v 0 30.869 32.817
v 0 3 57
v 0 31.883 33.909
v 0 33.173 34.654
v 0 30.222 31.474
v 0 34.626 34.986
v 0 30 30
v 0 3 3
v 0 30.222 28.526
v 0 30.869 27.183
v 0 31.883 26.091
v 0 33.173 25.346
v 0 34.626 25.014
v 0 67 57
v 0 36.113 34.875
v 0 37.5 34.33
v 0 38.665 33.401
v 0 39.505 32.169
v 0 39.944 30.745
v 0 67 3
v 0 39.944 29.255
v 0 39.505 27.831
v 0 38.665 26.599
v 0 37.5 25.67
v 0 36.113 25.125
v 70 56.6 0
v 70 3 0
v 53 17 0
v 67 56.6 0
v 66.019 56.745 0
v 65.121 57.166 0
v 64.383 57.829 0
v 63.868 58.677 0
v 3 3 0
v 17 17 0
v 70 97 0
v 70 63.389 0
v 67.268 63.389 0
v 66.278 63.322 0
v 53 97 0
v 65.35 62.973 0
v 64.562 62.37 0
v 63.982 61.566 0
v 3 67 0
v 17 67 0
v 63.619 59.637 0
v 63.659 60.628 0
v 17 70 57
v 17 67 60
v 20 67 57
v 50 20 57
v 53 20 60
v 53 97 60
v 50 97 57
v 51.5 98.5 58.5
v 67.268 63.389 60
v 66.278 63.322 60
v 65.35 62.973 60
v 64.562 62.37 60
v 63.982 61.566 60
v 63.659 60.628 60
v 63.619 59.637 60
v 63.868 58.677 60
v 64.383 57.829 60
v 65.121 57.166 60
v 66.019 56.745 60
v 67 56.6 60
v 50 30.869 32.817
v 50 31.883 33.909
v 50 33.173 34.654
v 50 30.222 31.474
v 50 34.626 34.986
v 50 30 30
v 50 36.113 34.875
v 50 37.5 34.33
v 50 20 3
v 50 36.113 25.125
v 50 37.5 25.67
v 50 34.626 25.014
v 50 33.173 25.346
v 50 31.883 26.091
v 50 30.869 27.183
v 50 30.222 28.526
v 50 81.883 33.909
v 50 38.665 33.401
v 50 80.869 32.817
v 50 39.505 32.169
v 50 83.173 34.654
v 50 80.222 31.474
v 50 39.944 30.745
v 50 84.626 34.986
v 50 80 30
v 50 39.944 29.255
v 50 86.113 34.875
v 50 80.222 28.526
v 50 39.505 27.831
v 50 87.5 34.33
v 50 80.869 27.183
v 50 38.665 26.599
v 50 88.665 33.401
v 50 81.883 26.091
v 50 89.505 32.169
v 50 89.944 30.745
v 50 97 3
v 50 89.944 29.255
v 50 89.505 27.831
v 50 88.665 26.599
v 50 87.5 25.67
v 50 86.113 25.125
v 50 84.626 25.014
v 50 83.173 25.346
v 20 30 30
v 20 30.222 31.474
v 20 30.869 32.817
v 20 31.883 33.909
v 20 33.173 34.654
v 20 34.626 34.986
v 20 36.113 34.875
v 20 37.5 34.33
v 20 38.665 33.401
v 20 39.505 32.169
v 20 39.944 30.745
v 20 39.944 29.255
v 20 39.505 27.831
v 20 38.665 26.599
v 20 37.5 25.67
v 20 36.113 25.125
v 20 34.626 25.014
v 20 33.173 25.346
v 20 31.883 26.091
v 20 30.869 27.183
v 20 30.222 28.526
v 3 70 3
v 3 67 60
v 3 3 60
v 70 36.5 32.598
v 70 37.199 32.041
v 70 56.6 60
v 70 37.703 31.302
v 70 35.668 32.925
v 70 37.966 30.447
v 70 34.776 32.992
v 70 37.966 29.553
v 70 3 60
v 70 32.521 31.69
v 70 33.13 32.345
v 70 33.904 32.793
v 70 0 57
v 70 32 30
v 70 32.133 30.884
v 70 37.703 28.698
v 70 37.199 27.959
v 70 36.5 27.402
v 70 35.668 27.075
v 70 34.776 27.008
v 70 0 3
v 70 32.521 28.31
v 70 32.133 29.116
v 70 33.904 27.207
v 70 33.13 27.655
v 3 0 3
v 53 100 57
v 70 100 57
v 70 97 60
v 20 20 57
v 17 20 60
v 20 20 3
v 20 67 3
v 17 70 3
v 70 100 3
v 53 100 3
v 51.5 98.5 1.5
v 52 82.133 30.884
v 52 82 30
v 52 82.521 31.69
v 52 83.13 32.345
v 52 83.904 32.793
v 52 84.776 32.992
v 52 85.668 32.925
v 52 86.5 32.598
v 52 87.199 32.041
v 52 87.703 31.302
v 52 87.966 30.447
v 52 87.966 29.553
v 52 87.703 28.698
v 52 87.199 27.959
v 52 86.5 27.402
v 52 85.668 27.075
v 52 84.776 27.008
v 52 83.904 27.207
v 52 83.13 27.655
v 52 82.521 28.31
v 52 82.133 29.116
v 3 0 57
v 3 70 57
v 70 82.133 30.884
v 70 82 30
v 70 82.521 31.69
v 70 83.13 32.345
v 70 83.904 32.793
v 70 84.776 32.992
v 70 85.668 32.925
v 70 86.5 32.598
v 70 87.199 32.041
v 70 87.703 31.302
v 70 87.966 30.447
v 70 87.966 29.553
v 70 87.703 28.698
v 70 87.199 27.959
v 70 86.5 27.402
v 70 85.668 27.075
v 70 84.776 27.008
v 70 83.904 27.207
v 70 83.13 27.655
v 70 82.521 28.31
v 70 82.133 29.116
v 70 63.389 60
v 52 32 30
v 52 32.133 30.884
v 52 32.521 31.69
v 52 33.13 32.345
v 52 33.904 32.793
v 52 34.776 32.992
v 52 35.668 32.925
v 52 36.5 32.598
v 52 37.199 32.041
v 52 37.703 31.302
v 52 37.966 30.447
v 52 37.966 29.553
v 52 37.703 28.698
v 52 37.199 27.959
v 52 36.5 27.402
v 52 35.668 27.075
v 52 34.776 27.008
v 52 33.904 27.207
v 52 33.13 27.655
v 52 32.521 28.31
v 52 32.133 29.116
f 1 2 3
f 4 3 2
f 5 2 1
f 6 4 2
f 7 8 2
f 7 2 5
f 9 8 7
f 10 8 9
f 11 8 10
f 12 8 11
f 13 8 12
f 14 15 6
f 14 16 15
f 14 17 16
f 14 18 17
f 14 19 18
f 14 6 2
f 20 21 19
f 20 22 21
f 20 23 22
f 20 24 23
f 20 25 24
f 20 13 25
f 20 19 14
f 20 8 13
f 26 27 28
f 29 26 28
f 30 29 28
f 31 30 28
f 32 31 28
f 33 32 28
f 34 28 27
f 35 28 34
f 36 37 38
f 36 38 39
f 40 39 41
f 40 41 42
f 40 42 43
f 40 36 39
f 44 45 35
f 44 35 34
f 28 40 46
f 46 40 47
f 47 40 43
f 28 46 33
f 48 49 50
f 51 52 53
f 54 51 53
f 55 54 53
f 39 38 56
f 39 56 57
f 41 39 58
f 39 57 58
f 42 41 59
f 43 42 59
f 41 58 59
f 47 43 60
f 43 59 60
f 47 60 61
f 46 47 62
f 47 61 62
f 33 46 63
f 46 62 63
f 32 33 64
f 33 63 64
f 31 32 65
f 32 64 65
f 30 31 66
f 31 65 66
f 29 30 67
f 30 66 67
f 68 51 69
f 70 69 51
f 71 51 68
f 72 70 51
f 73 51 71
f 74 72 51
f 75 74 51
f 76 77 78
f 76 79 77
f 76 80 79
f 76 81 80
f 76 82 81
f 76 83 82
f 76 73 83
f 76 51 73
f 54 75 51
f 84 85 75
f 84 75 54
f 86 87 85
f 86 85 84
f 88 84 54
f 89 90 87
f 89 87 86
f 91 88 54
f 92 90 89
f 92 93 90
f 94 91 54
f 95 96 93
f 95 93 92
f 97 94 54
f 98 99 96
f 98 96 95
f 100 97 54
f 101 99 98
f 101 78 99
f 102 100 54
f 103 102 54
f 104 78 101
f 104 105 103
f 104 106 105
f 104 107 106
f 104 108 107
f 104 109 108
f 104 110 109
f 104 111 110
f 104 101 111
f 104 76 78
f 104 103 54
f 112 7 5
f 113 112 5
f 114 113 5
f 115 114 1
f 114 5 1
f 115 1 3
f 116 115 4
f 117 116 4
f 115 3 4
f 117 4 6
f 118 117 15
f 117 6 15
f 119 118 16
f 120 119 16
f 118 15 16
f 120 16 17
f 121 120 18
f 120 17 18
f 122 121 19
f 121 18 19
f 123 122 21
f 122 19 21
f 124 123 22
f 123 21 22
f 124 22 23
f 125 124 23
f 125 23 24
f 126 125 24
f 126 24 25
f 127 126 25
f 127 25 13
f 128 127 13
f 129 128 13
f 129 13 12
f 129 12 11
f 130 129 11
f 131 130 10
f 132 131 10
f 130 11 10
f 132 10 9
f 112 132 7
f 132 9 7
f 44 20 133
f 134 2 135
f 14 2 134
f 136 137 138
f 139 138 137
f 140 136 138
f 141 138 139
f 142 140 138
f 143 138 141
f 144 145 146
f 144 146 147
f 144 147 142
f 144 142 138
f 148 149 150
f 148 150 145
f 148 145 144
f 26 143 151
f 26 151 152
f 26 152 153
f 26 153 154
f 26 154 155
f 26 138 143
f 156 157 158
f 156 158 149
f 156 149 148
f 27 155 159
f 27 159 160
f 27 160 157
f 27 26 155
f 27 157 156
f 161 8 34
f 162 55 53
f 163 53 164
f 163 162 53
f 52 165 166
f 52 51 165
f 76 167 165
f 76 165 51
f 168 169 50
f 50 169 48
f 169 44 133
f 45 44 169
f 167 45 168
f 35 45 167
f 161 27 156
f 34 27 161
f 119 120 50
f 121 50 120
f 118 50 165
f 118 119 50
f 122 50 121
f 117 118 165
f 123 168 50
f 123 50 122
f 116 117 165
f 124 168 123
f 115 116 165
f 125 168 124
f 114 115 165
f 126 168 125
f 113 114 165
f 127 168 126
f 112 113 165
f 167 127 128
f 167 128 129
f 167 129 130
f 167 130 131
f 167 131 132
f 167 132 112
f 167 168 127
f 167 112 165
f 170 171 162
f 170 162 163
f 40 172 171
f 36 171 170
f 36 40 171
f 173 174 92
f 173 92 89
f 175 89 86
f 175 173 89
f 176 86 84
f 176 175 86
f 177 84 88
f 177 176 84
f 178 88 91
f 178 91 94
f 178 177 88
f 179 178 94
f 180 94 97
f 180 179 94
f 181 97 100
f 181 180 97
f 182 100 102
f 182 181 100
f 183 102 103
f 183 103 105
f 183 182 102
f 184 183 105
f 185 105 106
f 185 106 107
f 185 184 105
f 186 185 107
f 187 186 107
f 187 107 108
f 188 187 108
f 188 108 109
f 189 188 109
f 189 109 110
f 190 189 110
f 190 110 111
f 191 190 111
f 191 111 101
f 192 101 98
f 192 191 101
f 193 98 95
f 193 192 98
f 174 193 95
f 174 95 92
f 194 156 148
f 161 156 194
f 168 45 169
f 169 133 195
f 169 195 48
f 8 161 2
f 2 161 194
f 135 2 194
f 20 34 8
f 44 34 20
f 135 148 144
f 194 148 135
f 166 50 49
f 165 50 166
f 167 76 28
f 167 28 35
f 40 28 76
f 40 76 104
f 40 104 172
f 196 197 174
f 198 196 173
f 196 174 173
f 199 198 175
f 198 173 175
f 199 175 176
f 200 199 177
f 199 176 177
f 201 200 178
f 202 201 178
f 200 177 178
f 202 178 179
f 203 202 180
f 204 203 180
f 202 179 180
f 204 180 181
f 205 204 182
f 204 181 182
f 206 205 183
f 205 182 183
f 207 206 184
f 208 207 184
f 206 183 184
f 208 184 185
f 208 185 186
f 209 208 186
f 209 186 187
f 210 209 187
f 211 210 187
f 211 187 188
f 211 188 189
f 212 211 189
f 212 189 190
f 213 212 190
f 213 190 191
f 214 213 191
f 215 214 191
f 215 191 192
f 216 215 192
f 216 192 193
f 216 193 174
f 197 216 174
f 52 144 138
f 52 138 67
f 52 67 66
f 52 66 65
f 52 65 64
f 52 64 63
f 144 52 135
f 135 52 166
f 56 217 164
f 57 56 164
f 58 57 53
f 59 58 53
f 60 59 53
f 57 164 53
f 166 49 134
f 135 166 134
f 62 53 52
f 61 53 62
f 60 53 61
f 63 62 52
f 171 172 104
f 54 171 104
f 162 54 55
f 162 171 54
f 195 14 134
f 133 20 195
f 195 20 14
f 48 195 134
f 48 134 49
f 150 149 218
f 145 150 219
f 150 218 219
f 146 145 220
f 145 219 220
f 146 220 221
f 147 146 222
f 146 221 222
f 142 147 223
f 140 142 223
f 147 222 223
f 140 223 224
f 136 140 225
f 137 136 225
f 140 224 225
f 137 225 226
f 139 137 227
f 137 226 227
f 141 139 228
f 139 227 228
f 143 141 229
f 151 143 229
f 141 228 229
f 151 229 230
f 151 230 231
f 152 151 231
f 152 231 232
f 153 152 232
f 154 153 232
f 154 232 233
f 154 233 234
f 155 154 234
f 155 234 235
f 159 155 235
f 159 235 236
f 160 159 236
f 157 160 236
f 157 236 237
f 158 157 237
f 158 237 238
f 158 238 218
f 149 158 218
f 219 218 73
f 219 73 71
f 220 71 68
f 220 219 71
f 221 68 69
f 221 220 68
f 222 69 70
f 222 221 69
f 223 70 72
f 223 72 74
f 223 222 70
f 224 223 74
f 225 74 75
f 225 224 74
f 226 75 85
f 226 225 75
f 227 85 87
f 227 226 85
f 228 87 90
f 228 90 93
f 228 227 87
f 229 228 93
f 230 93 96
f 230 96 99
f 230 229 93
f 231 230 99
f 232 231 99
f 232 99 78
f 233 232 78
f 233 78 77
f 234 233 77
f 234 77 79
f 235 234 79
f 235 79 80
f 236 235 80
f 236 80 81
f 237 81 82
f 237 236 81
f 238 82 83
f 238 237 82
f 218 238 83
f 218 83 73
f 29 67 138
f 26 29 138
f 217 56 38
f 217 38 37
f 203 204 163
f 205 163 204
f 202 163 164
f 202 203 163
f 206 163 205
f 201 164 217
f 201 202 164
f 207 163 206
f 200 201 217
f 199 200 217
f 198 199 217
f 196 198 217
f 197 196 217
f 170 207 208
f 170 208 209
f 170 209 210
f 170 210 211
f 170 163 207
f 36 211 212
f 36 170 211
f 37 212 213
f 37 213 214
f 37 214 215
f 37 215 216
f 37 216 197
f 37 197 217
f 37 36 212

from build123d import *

# Parameters (mm, degrees)
PAD_DEPTH       = 60
POCKET_DEPTH    = 60.001
SKETCH002_R     = 3
POCKET001_DEPTH = 20.001
CHAMFER_SIZE    = 2
CHAMFER001_SIZE = 2
CHAMFER002_SIZE = 3
CHAMFER003_SIZE = 3
SKETCH003_R     = 5
POCKET002_DEPTH = 20


with BuildPart() as part:
    # Sketch → Pad (new body)
    with BuildSketch(Plane.XY):
        Polygon((0, 70), (20, 70), (20, 20), (50, 20), (50, 100), (70, 100), (70, 0), (0, 0), align=None)
    extrude(amount=PAD_DEPTH)

    # Sketch001 (on DatumPlane) → Pocket (cut, through all)
    with BuildSketch(Plane.XY.offset(60)):
        with BuildLine():
            ThreePointArc((67.267666, 63.389448), (63.602639, 60.133937), (67, 56.6))
            Line((67, 56.6), (70, 56.6))
            Line((70, 63.389448), (70, 56.6))
            Line((67.267666, 63.389448), (70, 63.389448))
        make_face()
    extrude(amount=-POCKET_DEPTH, mode=Mode.SUBTRACT)

    # Sketch002 (on Face14 of Pocket) → Pocket001 (cut, through all)
    with BuildSketch(Plane(origin=(50, 0, 0), x_dir=(0, -1, 0), z_dir=(-1, 0, 0))):
        with Locations((-85, 30)):
            Circle(SKETCH002_R)
        with Locations((-35, 30)):
            Circle(SKETCH002_R)
    extrude(amount=-POCKET001_DEPTH, mode=Mode.SUBTRACT)

    # Chamfer
    chamfer_edges = [part.edges().sort_by_distance(p)[0] for p in [
        (50, 88, 30),
    ]]
    chamfer(chamfer_edges, length=CHAMFER_SIZE)

    # Chamfer001
    chamfer001_edges = [part.edges().sort_by_distance(p)[0] for p in [
        (50, 38, 30),
    ]]
    chamfer(chamfer001_edges, length=CHAMFER001_SIZE)

    # Chamfer002
    chamfer002_edges = [part.edges().sort_by_distance(p)[0] for p in [
        (50, 100, 30),
        (50, 60, 0),
        (50, 60, 60),
    ]]
    chamfer(chamfer002_edges, length=CHAMFER002_SIZE)

    # Chamfer003
    chamfer003_edges = [part.edges().sort_by_distance(p)[0] for p in [
        (0, 35, 60),
        (0, 0, 30),
        (0, 35, 0),
        (0, 70, 30),
        (35, 0, 60),
        (35, 0, 0),
        (20, 45, 60),
        (10, 70, 60),
        (35, 20, 0),
        (20, 45, 0),
        (10, 70, 0),
        (20, 70, 30),
        (61.5, 100, 0),
        (61.5, 100, 60),
    ]]
    chamfer(chamfer003_edges, length=CHAMFER003_SIZE)

    # Sketch003 (on DatumPlane) → Pocket002 (cut)
    with BuildSketch(Plane(origin=(0, 0, 0), x_dir=(0, -1, 0), z_dir=(-1, 0, 0))):
        with Locations((-35, 30)):
            Circle(SKETCH003_R)
    extrude(amount=-POCKET002_DEPTH, mode=Mode.SUBTRACT)


solid = part.part
